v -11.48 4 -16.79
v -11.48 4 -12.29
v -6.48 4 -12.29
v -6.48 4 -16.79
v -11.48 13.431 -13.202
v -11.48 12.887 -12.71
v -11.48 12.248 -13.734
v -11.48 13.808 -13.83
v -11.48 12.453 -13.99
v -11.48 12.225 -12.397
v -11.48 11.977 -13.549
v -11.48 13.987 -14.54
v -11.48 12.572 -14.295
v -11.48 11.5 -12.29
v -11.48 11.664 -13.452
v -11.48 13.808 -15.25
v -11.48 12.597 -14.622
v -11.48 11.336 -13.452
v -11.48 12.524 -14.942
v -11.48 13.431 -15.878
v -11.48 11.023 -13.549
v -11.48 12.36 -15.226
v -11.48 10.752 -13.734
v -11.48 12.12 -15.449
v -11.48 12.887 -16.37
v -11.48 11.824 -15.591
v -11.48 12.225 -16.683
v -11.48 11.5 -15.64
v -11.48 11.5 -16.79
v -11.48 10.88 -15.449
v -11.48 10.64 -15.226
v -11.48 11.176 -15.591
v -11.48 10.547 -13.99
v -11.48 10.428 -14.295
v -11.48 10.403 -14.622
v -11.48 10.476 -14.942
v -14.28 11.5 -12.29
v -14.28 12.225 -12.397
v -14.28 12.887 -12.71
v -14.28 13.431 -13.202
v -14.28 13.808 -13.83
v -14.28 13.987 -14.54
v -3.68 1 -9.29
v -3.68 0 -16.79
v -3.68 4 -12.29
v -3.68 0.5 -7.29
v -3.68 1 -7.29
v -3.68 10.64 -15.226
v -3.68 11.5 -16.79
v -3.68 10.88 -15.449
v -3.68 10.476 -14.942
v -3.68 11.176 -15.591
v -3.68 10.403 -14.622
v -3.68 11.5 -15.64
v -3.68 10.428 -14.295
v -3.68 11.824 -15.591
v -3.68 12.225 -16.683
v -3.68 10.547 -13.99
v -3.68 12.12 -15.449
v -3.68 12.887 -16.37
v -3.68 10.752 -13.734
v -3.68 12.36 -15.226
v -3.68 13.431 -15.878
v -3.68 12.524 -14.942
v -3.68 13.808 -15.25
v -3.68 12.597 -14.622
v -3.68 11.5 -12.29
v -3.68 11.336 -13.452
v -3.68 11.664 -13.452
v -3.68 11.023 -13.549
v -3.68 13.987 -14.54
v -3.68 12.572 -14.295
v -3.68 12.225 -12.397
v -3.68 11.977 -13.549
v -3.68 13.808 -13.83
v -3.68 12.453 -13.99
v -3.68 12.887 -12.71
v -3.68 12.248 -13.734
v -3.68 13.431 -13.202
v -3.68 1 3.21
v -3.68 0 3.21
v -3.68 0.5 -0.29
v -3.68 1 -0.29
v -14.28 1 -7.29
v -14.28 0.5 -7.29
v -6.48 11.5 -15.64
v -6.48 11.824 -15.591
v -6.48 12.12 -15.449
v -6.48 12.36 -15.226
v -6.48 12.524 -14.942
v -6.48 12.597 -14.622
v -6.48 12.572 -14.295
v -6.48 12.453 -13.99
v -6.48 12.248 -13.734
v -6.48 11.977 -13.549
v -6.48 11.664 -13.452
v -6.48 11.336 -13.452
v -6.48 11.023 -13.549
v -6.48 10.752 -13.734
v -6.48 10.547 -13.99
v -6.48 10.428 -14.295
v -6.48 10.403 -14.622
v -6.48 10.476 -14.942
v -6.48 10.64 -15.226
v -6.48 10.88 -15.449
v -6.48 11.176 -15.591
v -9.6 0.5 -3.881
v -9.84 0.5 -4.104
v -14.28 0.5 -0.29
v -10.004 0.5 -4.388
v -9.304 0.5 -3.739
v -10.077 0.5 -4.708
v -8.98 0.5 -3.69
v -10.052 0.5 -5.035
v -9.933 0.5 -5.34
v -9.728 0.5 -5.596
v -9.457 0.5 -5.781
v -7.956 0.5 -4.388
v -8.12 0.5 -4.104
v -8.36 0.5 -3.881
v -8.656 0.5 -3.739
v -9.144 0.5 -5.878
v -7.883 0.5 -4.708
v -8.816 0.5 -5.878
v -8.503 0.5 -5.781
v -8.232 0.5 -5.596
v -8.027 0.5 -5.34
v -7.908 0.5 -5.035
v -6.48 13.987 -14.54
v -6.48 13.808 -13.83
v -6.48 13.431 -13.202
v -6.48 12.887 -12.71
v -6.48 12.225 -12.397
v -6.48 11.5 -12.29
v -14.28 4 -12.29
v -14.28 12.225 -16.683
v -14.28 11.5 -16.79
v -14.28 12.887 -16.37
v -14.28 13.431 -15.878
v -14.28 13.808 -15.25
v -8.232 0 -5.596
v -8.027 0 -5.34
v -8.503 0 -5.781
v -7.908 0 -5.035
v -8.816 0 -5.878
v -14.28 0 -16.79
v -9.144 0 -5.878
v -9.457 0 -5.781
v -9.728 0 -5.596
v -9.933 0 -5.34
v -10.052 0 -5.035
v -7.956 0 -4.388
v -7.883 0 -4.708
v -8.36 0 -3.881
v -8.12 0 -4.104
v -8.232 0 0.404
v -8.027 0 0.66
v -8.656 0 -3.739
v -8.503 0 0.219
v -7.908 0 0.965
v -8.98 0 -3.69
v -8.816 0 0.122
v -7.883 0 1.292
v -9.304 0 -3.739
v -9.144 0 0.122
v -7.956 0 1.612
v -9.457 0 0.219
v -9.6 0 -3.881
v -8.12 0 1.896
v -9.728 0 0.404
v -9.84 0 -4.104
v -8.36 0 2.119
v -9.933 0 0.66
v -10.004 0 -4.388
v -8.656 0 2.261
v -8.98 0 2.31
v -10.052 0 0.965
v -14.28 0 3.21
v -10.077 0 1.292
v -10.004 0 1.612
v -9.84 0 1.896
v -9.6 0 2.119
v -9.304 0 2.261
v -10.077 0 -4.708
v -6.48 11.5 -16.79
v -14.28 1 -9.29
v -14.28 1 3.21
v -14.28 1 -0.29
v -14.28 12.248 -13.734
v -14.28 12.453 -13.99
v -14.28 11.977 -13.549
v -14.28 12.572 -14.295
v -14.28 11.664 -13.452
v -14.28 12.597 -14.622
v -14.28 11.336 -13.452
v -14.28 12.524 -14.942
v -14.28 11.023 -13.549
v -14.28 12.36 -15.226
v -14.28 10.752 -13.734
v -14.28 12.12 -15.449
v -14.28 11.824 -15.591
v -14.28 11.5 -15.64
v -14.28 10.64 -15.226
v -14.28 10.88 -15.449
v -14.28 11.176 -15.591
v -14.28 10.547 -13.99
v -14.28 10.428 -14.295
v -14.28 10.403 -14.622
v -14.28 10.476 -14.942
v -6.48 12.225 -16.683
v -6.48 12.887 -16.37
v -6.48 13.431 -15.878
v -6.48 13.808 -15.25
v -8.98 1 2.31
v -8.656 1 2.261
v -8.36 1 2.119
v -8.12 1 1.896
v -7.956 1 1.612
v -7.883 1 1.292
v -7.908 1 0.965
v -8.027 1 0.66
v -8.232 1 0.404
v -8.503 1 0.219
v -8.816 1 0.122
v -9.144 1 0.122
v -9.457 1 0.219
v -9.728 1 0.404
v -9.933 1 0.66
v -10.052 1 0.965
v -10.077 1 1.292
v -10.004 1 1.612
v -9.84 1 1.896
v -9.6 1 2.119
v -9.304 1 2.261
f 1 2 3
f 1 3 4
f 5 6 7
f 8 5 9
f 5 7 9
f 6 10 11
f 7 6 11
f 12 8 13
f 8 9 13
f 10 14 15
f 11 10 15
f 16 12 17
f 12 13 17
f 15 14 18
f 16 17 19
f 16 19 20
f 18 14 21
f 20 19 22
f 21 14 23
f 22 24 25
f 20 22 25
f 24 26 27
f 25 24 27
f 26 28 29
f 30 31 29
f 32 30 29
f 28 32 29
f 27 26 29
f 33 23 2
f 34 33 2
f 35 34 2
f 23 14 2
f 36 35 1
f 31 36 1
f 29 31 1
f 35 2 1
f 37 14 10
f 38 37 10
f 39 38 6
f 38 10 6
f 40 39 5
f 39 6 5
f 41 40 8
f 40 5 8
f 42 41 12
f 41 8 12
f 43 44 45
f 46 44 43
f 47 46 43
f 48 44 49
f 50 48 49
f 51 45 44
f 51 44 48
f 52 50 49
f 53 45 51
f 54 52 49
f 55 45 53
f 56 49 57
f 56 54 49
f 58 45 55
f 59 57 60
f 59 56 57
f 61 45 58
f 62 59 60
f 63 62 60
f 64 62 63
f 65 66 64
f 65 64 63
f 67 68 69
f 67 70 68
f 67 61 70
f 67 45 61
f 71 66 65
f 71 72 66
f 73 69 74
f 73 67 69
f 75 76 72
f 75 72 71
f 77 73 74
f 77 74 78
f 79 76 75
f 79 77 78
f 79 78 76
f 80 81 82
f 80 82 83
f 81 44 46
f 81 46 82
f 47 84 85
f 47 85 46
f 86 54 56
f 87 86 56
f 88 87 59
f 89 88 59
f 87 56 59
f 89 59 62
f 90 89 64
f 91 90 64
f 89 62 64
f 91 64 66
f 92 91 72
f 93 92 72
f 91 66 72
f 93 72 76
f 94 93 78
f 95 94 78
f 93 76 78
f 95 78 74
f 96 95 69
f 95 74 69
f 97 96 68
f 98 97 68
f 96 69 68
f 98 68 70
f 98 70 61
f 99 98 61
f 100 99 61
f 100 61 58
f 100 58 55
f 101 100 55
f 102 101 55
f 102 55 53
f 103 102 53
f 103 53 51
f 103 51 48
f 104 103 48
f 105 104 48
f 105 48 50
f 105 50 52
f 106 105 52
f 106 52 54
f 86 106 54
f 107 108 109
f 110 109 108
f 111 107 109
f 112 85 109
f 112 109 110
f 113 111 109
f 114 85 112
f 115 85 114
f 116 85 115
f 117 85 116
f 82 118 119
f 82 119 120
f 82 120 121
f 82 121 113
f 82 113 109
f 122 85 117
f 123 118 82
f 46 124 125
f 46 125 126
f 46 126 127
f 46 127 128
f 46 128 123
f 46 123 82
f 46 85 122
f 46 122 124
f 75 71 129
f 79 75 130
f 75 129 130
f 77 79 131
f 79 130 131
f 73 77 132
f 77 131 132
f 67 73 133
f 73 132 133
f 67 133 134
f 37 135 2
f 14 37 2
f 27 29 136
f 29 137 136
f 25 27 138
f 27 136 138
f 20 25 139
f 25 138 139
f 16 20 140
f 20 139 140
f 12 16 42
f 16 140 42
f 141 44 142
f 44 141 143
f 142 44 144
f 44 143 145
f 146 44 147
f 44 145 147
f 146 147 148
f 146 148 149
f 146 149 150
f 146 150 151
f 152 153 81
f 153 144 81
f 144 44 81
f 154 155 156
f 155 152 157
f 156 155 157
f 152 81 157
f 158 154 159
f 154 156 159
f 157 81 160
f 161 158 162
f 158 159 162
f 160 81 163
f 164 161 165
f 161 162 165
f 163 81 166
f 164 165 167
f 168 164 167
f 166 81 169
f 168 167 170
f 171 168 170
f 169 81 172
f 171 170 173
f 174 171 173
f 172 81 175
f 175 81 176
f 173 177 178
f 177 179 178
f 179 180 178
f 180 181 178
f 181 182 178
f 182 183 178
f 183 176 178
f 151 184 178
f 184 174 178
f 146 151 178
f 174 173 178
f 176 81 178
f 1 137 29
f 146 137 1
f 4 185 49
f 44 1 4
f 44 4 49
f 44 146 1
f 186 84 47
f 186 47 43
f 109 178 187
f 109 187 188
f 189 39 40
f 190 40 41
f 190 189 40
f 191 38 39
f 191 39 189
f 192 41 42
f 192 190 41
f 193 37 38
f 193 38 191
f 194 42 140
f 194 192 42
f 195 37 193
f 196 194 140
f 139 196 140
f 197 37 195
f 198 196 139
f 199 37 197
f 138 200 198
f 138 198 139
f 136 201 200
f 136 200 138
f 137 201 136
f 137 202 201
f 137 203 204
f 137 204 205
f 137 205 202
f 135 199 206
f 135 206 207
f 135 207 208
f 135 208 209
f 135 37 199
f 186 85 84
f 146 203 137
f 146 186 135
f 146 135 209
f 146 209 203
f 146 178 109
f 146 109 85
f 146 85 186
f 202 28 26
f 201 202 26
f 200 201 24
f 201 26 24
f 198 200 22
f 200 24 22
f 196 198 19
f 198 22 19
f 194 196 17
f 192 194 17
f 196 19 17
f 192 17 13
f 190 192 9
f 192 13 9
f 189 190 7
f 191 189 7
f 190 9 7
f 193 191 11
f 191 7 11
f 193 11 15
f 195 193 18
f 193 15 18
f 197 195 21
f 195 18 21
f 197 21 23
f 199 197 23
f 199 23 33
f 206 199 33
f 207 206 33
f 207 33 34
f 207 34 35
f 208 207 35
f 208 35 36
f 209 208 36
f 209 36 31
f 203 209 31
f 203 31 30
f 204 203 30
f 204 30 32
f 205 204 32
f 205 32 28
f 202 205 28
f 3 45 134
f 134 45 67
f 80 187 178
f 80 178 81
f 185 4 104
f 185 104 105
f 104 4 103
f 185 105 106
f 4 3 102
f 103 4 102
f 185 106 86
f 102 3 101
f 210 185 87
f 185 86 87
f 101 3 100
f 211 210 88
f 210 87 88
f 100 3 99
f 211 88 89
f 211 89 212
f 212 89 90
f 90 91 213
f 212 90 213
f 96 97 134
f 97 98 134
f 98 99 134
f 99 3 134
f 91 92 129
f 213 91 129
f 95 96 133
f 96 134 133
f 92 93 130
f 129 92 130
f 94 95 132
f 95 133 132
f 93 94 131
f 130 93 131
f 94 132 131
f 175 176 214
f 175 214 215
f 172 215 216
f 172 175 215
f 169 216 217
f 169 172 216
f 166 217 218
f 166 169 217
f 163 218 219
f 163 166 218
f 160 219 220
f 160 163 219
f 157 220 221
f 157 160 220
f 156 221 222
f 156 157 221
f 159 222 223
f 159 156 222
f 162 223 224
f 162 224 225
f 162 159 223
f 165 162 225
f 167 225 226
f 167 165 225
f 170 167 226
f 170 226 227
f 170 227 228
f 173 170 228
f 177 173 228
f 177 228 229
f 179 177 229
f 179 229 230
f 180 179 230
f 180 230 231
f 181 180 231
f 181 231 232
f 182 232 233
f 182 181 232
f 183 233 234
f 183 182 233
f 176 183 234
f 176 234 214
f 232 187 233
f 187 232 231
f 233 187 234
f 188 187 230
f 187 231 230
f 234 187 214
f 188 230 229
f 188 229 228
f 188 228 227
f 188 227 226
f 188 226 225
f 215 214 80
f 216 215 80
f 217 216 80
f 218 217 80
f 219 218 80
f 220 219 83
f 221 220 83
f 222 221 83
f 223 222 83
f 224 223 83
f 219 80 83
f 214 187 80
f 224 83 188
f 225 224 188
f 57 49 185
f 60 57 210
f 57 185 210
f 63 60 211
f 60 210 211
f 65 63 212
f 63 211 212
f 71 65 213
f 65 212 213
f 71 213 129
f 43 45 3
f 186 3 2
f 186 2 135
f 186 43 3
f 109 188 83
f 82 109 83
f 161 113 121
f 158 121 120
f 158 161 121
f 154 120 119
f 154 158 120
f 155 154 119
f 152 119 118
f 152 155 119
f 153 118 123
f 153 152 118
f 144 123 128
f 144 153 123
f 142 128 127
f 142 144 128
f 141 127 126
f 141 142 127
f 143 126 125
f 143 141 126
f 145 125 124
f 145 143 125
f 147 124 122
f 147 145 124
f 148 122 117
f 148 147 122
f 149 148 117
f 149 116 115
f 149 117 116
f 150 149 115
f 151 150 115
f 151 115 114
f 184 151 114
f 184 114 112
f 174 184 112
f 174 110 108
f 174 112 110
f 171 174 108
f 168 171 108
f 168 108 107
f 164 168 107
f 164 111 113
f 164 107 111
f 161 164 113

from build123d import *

# Parameters (mm, degrees)
SKETCH1_R           = 1.1
BOSS_EXTRUDE1_DEPTH = 1
SKETCH2_W           = 2.8
SKETCH2_H           = 5
BOSS_EXTRUDE2_DEPTH = 8
SKETCH4_W           = 2.8
SKETCH4_H           = 9
BOSS_EXTRUDE3_DEPTH = 3
SKETCH5_R           = 1.1
CUT_EXTRUDE2_DEPTH  = 100
SKETCH6_W           = 2.8
SKETCH6_H           = 8
BOSS_EXTRUDE4_DEPTH = 1
SKETCH7_W           = 3.5
SKETCH7_H           = 9
CUT_EXTRUDE3_DEPTH  = 100
CHAMFER2_SIZE       = 3
SKETCH8_W           = 10.6
SKETCH8_H           = 3
CUT_EXTRUDE4_DEPTH  = 10
BOSS_EXTRUDE5_DEPTH = 7.8
SKETCH10_W          = 10.6
SKETCH10_H          = 7
CUT_EXTRUDE5_DEPTH  = 0.5
SKETCH11_W          = 2.8
SKETCH11_H          = 4.5
BOSS_EXTRUDE6_DEPTH = 4
SKETCH12_R          = 1.1
BOSS_EXTRUDE7_DEPTH = 10.6
SKETCH13_W          = 5
SKETCH13_H          = 4.5
CUT_EXTRUDE6_DEPTH  = 10
SKETCH14_R          = 1.1
CUT_EXTRUDE7_DEPTH  = 20
FILLET1_R           = 2.5


with BuildPart() as part:
    # Sketch1 → Boss-Extrude1 (new body)
    with BuildSketch(Plane(origin=(0, 0, 0), x_dir=(1, 0, 0), z_dir=(0, 1, 0))):
        Polygon((-14.28, 13.79), (-14.28, -6.21), (-3.68, -6.21), (-3.68, 13.79), (-6.48, 13.79), (-6.48, 8.79), (-11.48, 8.79), (-11.48, 13.79), align=None)
        with Locations(Location((-8.98, 4.79, 0), (0, 0, 270))):
            Circle(SKETCH1_R, mode=Mode.SUBTRACT)
        with Locations(Location((-8.98, -1.21, 0), (0, 0, 270))):
            Circle(SKETCH1_R, mode=Mode.SUBTRACT)
    extrude(amount=BOSS_EXTRUDE1_DEPTH)

    # Sketch2 → Boss-Extrude2 (add)
    with BuildSketch(Plane(origin=(0, 1, 0), x_dir=(1, 0, 0), z_dir=(0, 1, 0))):
        with Locations((-12.88, 11.29)):
            Rectangle(SKETCH2_W, SKETCH2_H)
        with Locations((-5.08, 11.29)):
            Rectangle(SKETCH2_W, SKETCH2_H)
    extrude(amount=BOSS_EXTRUDE2_DEPTH)

    # Sketch4 → Boss-Extrude3 (add)
    with BuildSketch(Plane(origin=(0, 0, -13.79), x_dir=(-1, 0, 0), z_dir=(0, 0, -1))):
        with Locations((5.08, 4.5)):
            Rectangle(SKETCH4_W, SKETCH4_H)
        with Locations((12.88, 4.5)):
            Rectangle(SKETCH4_W, SKETCH4_H)
    extrude(amount=BOSS_EXTRUDE3_DEPTH)

    # Sketch5 → Cut-Extrude2 (cut)
    with BuildSketch(Plane(origin=(-3.68, 0, 0), x_dir=(0, 0, -1), z_dir=(1, 0, 0))):
        with Locations((14.29, 7.5)):
            Circle(SKETCH5_R)
    extrude(amount=-CUT_EXTRUDE2_DEPTH, mode=Mode.SUBTRACT)

    # Sketch6 → Boss-Extrude4 (add)
    with BuildSketch(Plane(origin=(0, 9, 0), x_dir=(1, 0, 0), z_dir=(0, 1, 0))):
        with Locations((-12.88, 12.79)):
            Rectangle(SKETCH6_W, SKETCH6_H)
        with Locations((-5.08, 12.79)):
            Rectangle(SKETCH6_W, SKETCH6_H)
    extrude(amount=BOSS_EXTRUDE4_DEPTH)

    # Sketch7 → Cut-Extrude3 (cut)
    with BuildSketch(Plane(origin=(-3.68, 0, 0), x_dir=(0, 0, -1), z_dir=(1, 0, 0))):
        with Locations((10.54, 5.5)):
            Rectangle(SKETCH7_W, SKETCH7_H)
    extrude(amount=-CUT_EXTRUDE3_DEPTH, mode=Mode.SUBTRACT)

    # Chamfer2
    chamfer2_edges = [part.edges().sort_by_distance(p)[0] for p in [
        (-5.08, 1, -12.29),
        (-12.88, 1, -12.29),
    ]]
    chamfer(chamfer2_edges, length=CHAMFER2_SIZE)

    # Sketch8 → Cut-Extrude4 (cut)
    with BuildSketch(Plane(origin=(0, 1, 0), x_dir=(1, 0, 0), z_dir=(0, 1, 0))):
        with Locations((-8.98, -4.71)):
            Rectangle(SKETCH8_W, SKETCH8_H)
    extrude(amount=-CUT_EXTRUDE4_DEPTH, mode=Mode.SUBTRACT)

    # Sketch9 → Boss-Extrude5 (add)
    with BuildSketch(Plane(origin=(-11.48, 0, 0), x_dir=(0, 0, -1), z_dir=(1, 0, 0))):
        Polygon((8.79, 1), (9.29, 1), (12.29, 4), (16.79, 4), (16.79, 0), (8.79, 0), align=None)
    extrude(amount=BOSS_EXTRUDE5_DEPTH)

    # Sketch10 → Cut-Extrude5 (cut)
    with BuildSketch(Plane(origin=(0, 1, 0), x_dir=(1, 0, 0), z_dir=(0, 1, 0))):
        with Locations((-8.98, 3.79)):
            Rectangle(SKETCH10_W, SKETCH10_H)
    extrude(amount=-CUT_EXTRUDE5_DEPTH, mode=Mode.SUBTRACT)

    # Sketch11 → Boss-Extrude6 (add)
    with BuildSketch(Plane(origin=(0, 10, 0), x_dir=(1, 0, 0), z_dir=(0, 1, 0))):
        with Locations((-12.88, 14.54)):
            Rectangle(SKETCH11_W, SKETCH11_H)
        with Locations((-5.08, 14.54)):
            Rectangle(SKETCH11_W, SKETCH11_H)
    extrude(amount=BOSS_EXTRUDE6_DEPTH)

    # Sketch12 → Boss-Extrude7 (add)
    with BuildSketch(Plane(origin=(-3.68, 0, 0), x_dir=(0, 0, -1), z_dir=(1, 0, 0))):
        with Locations((14.29, 7.5)):
            Circle(SKETCH12_R)
    extrude(amount=-BOSS_EXTRUDE7_DEPTH)

    # Sketch13 → Cut-Extrude6 (cut)
    with BuildSketch(Plane(origin=(0, 14, 0), x_dir=(1, 0, 0), z_dir=(0, 1, 0))):
        with Locations((-8.98, 14.54)):
            Rectangle(SKETCH13_W, SKETCH13_H)
    extrude(amount=-CUT_EXTRUDE6_DEPTH, mode=Mode.SUBTRACT)

    # Sketch14 → Cut-Extrude7 (cut)
    with BuildSketch(Plane(origin=(-3.68, 0, 0), x_dir=(0, 0, -1), z_dir=(1, 0, 0))):
        with Locations((14.54, 11.5)):
            Circle(SKETCH14_R)
    extrude(amount=-CUT_EXTRUDE7_DEPTH, mode=Mode.SUBTRACT)

    # Fillet1
    # the kernel refuses this fillet: 2.5 mm, written as the material it takes off along each edge
    with BuildSketch(Plane(origin=(-20.53, 14, -16.79), x_dir=(0, 0, 1), z_dir=(1, 0, 0)), Plane(origin=(-12.73, 14, -12.29), x_dir=(0, -1, 0), z_dir=(1, 0, 0)), Plane(origin=(2.57, 14, -16.79), x_dir=(0, -1, 0), z_dir=(-1, 0, 0))) as fillet1_piece_1:
        with BuildLine():
            CenterArc((FILLET1_R, FILLET1_R), FILLET1_R, 180, 90)
            Line((0, FILLET1_R), (0, 0))
            Line((0, 0), (FILLET1_R, 0))
        make_face()
    extrude(amount=15.3, mode=Mode.SUBTRACT)
    with BuildSketch(Plane(origin=(-5.23, 14, -12.29), x_dir=(0, -1, 0), z_dir=(-1, 0, 0))) as fillet1_piece_2:
        with BuildLine():
            CenterArc((FILLET1_R, -FILLET1_R), FILLET1_R, 90, 90)
            Line((0, -FILLET1_R), (0, 0))
            Line((0, 0), (FILLET1_R, 0))
        make_face()
    extrude(amount=15.3, mode=Mode.SUBTRACT)


solid = part.part
